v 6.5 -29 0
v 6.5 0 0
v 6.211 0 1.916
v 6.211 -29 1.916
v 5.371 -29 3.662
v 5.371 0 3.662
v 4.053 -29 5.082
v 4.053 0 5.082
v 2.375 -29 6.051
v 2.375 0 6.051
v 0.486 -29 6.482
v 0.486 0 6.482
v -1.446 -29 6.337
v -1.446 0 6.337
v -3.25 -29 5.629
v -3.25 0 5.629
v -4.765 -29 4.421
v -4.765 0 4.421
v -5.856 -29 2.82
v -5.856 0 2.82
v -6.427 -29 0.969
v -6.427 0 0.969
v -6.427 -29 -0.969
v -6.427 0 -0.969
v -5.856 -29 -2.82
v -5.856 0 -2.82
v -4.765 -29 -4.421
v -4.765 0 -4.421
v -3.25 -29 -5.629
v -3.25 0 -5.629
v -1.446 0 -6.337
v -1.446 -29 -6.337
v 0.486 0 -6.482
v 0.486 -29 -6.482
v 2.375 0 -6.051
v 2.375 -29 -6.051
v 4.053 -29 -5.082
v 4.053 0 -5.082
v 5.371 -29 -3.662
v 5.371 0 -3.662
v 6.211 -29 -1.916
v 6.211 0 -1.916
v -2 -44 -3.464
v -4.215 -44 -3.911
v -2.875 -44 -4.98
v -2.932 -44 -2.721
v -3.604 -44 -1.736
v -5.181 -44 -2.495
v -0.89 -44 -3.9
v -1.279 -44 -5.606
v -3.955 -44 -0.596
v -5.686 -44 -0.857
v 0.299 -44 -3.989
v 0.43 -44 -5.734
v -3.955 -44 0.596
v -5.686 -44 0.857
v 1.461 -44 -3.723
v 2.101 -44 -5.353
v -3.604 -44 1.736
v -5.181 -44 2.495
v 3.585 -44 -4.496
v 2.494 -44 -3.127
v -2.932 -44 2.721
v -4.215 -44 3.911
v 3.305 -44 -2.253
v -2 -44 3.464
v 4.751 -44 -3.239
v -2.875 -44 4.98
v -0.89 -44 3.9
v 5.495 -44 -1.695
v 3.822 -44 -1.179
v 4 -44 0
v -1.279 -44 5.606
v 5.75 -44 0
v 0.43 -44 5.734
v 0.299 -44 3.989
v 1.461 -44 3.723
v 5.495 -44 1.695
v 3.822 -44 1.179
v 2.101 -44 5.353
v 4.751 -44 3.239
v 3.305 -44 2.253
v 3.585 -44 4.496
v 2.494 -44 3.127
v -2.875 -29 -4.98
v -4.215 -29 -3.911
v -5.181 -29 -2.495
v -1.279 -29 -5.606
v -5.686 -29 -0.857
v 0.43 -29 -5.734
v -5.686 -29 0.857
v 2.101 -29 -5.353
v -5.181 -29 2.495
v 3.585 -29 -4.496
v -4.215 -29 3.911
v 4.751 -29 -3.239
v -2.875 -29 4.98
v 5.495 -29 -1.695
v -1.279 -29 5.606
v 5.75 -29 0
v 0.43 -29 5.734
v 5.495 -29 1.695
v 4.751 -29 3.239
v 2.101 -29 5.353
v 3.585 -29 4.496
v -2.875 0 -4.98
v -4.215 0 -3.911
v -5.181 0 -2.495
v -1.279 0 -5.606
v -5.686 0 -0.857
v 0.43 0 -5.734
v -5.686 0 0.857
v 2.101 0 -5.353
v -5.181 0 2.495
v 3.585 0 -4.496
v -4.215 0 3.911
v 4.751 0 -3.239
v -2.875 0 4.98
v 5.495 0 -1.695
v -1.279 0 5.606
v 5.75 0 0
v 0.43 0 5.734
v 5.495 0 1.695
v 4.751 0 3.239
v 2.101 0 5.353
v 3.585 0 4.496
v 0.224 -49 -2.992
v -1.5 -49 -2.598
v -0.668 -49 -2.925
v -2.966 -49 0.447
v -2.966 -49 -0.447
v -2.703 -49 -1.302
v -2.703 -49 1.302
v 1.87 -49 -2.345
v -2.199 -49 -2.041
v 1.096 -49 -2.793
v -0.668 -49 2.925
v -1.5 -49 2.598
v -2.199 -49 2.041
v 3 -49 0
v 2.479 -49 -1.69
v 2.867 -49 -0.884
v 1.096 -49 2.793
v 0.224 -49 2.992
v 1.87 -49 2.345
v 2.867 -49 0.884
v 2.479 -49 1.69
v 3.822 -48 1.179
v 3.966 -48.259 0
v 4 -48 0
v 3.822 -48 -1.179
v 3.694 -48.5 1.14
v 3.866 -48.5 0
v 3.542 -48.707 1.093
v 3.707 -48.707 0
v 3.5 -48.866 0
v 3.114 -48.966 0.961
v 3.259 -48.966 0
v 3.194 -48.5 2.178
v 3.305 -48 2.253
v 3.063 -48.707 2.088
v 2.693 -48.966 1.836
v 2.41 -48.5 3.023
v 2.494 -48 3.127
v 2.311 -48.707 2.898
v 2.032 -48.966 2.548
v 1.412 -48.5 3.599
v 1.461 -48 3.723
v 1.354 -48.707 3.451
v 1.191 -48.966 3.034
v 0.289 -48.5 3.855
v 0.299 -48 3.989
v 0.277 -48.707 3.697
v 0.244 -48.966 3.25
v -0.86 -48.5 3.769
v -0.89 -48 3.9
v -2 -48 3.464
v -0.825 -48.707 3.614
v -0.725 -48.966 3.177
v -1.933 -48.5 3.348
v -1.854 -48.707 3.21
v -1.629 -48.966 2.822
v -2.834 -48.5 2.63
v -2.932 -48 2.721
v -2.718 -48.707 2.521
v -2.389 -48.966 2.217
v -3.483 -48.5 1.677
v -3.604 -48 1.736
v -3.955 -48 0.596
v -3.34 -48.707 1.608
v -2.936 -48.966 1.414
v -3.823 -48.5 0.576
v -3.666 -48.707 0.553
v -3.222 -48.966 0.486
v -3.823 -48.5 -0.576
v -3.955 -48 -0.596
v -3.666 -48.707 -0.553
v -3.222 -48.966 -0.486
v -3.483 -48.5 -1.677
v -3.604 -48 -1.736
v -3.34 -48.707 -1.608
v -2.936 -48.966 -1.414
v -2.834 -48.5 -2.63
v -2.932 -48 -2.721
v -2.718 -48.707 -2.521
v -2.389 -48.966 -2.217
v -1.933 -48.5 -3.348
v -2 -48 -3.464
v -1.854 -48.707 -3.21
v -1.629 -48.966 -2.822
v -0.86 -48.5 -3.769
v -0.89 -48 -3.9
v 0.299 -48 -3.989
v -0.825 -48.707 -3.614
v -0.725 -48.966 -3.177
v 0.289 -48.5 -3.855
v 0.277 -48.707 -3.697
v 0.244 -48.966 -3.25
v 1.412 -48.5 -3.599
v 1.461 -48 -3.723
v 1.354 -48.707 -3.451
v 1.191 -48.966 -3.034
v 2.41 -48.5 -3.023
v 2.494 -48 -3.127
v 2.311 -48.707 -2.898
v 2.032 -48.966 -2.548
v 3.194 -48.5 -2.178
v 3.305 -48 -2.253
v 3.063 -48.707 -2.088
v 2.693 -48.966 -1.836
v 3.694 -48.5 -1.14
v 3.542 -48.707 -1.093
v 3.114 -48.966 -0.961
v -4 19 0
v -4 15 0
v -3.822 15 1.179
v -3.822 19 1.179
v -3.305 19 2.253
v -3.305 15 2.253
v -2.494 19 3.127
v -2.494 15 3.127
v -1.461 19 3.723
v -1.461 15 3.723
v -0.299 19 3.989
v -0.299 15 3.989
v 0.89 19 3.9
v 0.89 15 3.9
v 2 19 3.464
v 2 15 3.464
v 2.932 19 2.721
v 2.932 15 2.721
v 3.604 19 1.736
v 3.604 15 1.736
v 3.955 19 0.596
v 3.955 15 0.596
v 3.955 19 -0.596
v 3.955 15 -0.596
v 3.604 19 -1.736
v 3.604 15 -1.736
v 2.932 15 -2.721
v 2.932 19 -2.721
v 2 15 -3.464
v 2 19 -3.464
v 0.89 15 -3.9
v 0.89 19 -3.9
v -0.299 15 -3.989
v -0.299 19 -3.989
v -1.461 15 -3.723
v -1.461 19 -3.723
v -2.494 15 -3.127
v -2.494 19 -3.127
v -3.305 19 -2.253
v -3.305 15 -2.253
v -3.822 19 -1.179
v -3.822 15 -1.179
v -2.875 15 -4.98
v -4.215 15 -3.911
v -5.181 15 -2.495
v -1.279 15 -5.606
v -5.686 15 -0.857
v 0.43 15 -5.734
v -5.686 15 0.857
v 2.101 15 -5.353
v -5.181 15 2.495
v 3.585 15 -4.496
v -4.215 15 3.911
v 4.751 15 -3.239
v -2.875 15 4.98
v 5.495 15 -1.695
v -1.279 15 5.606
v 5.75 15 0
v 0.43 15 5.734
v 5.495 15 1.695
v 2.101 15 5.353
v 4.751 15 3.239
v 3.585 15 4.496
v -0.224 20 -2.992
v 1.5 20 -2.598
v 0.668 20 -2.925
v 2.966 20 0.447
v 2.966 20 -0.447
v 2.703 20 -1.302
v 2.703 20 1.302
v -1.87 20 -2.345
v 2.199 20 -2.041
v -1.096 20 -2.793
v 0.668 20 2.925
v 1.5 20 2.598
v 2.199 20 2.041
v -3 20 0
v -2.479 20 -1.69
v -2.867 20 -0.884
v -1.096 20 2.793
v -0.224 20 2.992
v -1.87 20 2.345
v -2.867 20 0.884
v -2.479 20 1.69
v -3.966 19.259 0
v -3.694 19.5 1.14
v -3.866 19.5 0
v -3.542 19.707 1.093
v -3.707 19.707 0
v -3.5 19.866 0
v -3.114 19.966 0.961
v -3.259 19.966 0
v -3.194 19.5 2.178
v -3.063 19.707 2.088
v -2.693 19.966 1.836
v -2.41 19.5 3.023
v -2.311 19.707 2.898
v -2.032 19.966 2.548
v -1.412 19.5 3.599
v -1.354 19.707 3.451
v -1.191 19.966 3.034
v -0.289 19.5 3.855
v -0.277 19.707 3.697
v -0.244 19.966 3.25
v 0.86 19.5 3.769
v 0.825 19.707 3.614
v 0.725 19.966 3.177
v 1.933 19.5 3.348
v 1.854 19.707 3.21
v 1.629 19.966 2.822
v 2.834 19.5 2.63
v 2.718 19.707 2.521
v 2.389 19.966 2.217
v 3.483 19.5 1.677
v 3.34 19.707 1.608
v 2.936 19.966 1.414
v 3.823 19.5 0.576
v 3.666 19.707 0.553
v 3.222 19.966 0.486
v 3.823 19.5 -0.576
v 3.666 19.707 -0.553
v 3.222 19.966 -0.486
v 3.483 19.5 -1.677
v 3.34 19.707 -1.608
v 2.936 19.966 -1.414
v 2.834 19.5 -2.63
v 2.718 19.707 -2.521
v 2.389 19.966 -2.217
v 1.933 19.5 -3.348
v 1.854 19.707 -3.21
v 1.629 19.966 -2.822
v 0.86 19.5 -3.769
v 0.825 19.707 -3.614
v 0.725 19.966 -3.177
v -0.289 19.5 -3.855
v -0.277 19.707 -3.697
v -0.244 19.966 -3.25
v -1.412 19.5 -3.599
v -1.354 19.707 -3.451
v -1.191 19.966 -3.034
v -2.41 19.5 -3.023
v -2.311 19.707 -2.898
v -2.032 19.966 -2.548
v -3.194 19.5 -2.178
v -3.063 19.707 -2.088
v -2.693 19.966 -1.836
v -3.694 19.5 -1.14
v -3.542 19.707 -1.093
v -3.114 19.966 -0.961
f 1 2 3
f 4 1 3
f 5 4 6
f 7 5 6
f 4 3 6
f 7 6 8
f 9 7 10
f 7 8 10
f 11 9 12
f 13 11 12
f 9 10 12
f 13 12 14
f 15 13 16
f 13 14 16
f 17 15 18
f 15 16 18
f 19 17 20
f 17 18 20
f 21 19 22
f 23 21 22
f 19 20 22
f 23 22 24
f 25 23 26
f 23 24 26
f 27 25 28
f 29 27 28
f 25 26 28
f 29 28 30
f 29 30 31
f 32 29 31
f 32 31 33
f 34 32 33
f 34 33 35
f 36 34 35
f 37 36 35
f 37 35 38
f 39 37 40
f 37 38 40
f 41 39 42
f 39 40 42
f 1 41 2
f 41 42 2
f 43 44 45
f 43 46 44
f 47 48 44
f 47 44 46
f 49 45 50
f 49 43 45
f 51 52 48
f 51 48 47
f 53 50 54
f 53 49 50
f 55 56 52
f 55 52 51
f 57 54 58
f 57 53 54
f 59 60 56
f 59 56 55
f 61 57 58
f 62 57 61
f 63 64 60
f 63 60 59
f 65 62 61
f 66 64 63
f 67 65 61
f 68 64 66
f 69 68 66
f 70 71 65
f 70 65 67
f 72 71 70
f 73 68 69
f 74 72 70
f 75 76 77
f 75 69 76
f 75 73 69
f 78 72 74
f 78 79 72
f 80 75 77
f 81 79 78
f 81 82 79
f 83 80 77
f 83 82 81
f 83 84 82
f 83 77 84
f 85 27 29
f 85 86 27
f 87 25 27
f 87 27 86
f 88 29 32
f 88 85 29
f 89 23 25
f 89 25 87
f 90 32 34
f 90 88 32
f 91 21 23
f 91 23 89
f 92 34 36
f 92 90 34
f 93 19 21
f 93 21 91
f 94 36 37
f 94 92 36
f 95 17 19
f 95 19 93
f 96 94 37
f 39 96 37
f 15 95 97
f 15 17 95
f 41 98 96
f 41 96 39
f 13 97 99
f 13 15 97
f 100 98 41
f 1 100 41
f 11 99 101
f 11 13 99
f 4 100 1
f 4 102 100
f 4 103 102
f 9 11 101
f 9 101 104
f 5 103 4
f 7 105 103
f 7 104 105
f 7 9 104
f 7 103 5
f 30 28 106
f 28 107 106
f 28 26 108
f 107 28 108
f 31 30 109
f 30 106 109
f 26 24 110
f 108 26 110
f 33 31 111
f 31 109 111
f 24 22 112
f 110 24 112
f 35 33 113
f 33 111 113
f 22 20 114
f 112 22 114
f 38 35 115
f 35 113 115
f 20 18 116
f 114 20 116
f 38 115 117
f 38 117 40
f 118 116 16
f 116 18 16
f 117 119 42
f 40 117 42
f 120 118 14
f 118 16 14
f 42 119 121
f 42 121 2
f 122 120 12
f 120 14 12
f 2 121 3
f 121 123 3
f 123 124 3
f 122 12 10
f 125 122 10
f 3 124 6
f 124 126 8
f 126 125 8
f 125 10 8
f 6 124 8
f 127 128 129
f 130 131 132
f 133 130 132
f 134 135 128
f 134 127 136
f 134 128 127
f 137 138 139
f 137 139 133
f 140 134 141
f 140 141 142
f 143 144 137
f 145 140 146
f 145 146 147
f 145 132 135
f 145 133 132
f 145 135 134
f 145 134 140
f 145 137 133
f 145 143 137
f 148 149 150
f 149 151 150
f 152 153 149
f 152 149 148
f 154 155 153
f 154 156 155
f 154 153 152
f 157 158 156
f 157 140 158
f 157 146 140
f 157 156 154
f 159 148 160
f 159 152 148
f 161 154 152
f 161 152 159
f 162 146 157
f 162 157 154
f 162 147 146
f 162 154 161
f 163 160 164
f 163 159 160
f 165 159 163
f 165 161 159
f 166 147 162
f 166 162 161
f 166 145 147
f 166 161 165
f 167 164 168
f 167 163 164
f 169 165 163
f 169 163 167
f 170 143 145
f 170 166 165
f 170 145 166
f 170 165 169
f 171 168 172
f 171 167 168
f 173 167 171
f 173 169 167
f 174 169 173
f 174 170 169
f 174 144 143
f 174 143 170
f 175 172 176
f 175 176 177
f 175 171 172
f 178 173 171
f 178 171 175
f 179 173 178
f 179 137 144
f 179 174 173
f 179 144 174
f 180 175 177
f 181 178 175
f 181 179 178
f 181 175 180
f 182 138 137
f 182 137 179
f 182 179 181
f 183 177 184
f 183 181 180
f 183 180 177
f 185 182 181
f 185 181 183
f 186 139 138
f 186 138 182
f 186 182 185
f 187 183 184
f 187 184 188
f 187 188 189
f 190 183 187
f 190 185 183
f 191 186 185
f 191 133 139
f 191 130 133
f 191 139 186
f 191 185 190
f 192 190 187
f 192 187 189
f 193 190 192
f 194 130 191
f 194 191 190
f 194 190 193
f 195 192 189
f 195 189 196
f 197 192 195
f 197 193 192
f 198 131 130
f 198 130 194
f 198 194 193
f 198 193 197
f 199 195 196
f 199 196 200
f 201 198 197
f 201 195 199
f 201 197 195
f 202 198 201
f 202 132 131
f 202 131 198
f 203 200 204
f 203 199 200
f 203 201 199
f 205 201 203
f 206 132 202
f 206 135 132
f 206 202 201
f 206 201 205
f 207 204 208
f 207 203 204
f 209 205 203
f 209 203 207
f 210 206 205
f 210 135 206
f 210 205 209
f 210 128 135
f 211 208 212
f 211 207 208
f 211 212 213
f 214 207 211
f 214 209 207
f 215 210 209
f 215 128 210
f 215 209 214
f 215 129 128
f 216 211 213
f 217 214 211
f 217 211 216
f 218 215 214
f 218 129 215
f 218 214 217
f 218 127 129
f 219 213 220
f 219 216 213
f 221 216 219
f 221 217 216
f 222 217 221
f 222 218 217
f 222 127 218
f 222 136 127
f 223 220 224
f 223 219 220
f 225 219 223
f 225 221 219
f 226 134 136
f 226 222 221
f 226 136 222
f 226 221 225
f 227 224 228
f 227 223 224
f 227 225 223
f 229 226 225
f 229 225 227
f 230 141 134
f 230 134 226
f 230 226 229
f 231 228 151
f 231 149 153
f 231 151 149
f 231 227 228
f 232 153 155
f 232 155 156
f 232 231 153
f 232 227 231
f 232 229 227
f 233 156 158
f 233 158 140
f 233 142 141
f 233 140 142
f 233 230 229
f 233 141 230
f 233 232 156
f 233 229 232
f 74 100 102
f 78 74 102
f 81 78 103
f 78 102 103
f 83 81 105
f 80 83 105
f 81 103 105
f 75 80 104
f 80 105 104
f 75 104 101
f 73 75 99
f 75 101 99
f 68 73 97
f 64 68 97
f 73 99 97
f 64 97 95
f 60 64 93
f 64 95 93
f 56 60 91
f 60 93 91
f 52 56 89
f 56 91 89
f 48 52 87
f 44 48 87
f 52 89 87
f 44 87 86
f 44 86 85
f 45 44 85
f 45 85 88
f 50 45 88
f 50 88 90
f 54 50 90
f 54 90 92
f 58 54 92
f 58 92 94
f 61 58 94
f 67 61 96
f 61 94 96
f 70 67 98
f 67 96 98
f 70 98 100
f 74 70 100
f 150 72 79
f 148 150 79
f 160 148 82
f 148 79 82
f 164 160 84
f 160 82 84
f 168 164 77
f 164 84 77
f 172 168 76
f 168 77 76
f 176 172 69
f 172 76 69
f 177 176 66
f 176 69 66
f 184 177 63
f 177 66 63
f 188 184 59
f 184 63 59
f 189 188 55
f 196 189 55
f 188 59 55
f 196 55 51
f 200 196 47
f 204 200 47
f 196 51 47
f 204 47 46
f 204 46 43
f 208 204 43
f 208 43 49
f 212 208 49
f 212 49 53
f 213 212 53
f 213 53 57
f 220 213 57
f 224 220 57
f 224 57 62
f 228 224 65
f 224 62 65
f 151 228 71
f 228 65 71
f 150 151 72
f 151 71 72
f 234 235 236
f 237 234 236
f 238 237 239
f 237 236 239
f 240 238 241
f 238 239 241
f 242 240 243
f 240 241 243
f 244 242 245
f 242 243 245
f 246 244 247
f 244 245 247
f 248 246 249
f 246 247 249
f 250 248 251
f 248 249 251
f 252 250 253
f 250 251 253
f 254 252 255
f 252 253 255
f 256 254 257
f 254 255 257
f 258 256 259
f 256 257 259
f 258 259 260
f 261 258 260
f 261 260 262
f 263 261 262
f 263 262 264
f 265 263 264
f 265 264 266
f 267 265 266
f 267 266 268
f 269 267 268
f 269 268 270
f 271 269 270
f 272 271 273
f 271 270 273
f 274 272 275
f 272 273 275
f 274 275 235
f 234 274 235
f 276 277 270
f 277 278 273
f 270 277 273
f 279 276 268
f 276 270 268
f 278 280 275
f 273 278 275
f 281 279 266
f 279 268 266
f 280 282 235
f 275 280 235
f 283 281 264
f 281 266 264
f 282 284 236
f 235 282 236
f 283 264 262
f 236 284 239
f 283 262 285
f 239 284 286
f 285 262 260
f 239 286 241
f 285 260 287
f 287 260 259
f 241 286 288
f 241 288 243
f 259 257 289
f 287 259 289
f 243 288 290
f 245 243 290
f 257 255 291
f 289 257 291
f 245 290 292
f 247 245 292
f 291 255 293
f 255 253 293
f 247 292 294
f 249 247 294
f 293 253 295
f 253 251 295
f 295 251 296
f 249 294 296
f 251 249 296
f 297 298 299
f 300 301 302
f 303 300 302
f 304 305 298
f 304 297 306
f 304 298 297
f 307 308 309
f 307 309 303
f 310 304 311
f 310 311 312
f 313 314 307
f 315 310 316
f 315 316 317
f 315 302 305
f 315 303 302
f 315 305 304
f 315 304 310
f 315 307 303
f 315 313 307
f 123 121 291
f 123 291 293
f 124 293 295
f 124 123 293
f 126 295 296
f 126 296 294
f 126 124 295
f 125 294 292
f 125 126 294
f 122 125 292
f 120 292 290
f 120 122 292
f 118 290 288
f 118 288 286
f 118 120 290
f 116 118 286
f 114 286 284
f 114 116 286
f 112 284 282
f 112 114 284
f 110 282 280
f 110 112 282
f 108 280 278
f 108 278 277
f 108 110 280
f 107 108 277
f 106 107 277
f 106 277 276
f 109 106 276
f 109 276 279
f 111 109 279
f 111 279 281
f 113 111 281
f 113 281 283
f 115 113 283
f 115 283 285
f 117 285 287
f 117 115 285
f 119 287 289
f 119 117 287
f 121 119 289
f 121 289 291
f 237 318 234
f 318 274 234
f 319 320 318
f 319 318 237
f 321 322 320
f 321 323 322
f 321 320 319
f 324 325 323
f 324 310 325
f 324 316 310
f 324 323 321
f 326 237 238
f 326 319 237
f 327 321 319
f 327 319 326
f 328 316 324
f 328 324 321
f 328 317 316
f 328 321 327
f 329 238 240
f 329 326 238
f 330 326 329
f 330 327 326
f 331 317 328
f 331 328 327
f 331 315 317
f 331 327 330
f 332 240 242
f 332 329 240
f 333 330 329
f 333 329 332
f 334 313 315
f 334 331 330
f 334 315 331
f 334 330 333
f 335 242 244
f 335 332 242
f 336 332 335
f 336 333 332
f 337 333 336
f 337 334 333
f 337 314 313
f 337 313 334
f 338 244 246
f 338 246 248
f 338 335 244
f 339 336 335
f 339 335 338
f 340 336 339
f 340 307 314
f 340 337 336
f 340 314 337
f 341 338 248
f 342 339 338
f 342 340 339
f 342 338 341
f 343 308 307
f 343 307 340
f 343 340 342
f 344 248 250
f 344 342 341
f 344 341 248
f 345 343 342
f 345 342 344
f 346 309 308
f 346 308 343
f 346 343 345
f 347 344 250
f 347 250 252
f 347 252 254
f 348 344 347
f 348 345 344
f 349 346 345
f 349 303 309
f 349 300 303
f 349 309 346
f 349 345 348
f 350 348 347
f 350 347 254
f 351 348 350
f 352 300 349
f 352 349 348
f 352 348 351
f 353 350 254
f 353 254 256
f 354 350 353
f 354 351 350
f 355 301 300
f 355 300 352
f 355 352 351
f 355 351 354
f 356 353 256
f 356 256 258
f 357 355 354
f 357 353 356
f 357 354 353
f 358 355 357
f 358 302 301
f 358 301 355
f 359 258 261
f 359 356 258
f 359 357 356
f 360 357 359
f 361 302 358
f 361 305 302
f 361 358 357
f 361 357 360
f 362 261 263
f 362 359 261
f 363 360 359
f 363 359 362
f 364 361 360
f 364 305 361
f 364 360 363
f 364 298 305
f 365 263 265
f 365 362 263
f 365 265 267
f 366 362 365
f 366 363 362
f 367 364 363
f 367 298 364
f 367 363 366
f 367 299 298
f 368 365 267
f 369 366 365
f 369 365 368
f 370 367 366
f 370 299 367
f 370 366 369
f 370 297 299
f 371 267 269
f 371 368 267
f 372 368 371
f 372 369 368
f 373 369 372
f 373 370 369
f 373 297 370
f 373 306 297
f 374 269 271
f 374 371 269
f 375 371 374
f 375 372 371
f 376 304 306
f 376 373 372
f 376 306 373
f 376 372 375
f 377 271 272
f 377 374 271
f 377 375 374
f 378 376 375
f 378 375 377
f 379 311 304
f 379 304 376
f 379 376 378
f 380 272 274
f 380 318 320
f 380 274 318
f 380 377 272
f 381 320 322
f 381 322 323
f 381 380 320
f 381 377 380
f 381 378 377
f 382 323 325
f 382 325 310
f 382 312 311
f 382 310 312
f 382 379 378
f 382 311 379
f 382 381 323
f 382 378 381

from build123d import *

# Parameters (mm, degrees)
F0_R     = 6.5
F1_DEPTH = 29
F2_R     = 5.75
F3_DEPTH = 15
F4_R     = 4
F5_DEPTH = 5
F6_R     = 5.75
F7_DEPTH = 15
F8_R     = 4
F9_DEPTH = 5
F10_R    = 1


with BuildPart() as f1:
    # F0 (on Front) → F1 (new body)
    with BuildSketch(Plane.XZ):
        Circle(F0_R)
    extrude(amount=F1_DEPTH)

    # F2 (on Front) → F3 (join)
    with BuildSketch(Plane.XZ):
        Circle(F2_R)
    extrude(amount=-F3_DEPTH)



with BuildPart() as f5:
    # F4 (on face) → F5 (new body)
    with BuildSketch(Plane.XZ.offset(44)):
        Circle(F4_R)
    extrude(amount=F5_DEPTH)


with BuildPart() as f1_1:
    add(f1.part)

    add(f5.part)  # F7 merges F5
    # F6 (on face) → F7 (join)
    with BuildSketch(Plane.XZ.offset(29)):
        Circle(F6_R)
    extrude(amount=F7_DEPTH)

    # F8 (on face) → F9 (join)
    with BuildSketch(Plane(origin=(0, 15, 0), x_dir=(-1, 0, 0), z_dir=(0, 1, 0))):
        Circle(F8_R)
    extrude(amount=F9_DEPTH)

    # F10
    f10_edges = [f1_1.edges().sort_by_distance(p)[0] for p in [
        (4, 20, 0),
        (-4, -49, 0),
    ]]
    fillet(f10_edges, radius=F10_R)


solid = f1_1.part
